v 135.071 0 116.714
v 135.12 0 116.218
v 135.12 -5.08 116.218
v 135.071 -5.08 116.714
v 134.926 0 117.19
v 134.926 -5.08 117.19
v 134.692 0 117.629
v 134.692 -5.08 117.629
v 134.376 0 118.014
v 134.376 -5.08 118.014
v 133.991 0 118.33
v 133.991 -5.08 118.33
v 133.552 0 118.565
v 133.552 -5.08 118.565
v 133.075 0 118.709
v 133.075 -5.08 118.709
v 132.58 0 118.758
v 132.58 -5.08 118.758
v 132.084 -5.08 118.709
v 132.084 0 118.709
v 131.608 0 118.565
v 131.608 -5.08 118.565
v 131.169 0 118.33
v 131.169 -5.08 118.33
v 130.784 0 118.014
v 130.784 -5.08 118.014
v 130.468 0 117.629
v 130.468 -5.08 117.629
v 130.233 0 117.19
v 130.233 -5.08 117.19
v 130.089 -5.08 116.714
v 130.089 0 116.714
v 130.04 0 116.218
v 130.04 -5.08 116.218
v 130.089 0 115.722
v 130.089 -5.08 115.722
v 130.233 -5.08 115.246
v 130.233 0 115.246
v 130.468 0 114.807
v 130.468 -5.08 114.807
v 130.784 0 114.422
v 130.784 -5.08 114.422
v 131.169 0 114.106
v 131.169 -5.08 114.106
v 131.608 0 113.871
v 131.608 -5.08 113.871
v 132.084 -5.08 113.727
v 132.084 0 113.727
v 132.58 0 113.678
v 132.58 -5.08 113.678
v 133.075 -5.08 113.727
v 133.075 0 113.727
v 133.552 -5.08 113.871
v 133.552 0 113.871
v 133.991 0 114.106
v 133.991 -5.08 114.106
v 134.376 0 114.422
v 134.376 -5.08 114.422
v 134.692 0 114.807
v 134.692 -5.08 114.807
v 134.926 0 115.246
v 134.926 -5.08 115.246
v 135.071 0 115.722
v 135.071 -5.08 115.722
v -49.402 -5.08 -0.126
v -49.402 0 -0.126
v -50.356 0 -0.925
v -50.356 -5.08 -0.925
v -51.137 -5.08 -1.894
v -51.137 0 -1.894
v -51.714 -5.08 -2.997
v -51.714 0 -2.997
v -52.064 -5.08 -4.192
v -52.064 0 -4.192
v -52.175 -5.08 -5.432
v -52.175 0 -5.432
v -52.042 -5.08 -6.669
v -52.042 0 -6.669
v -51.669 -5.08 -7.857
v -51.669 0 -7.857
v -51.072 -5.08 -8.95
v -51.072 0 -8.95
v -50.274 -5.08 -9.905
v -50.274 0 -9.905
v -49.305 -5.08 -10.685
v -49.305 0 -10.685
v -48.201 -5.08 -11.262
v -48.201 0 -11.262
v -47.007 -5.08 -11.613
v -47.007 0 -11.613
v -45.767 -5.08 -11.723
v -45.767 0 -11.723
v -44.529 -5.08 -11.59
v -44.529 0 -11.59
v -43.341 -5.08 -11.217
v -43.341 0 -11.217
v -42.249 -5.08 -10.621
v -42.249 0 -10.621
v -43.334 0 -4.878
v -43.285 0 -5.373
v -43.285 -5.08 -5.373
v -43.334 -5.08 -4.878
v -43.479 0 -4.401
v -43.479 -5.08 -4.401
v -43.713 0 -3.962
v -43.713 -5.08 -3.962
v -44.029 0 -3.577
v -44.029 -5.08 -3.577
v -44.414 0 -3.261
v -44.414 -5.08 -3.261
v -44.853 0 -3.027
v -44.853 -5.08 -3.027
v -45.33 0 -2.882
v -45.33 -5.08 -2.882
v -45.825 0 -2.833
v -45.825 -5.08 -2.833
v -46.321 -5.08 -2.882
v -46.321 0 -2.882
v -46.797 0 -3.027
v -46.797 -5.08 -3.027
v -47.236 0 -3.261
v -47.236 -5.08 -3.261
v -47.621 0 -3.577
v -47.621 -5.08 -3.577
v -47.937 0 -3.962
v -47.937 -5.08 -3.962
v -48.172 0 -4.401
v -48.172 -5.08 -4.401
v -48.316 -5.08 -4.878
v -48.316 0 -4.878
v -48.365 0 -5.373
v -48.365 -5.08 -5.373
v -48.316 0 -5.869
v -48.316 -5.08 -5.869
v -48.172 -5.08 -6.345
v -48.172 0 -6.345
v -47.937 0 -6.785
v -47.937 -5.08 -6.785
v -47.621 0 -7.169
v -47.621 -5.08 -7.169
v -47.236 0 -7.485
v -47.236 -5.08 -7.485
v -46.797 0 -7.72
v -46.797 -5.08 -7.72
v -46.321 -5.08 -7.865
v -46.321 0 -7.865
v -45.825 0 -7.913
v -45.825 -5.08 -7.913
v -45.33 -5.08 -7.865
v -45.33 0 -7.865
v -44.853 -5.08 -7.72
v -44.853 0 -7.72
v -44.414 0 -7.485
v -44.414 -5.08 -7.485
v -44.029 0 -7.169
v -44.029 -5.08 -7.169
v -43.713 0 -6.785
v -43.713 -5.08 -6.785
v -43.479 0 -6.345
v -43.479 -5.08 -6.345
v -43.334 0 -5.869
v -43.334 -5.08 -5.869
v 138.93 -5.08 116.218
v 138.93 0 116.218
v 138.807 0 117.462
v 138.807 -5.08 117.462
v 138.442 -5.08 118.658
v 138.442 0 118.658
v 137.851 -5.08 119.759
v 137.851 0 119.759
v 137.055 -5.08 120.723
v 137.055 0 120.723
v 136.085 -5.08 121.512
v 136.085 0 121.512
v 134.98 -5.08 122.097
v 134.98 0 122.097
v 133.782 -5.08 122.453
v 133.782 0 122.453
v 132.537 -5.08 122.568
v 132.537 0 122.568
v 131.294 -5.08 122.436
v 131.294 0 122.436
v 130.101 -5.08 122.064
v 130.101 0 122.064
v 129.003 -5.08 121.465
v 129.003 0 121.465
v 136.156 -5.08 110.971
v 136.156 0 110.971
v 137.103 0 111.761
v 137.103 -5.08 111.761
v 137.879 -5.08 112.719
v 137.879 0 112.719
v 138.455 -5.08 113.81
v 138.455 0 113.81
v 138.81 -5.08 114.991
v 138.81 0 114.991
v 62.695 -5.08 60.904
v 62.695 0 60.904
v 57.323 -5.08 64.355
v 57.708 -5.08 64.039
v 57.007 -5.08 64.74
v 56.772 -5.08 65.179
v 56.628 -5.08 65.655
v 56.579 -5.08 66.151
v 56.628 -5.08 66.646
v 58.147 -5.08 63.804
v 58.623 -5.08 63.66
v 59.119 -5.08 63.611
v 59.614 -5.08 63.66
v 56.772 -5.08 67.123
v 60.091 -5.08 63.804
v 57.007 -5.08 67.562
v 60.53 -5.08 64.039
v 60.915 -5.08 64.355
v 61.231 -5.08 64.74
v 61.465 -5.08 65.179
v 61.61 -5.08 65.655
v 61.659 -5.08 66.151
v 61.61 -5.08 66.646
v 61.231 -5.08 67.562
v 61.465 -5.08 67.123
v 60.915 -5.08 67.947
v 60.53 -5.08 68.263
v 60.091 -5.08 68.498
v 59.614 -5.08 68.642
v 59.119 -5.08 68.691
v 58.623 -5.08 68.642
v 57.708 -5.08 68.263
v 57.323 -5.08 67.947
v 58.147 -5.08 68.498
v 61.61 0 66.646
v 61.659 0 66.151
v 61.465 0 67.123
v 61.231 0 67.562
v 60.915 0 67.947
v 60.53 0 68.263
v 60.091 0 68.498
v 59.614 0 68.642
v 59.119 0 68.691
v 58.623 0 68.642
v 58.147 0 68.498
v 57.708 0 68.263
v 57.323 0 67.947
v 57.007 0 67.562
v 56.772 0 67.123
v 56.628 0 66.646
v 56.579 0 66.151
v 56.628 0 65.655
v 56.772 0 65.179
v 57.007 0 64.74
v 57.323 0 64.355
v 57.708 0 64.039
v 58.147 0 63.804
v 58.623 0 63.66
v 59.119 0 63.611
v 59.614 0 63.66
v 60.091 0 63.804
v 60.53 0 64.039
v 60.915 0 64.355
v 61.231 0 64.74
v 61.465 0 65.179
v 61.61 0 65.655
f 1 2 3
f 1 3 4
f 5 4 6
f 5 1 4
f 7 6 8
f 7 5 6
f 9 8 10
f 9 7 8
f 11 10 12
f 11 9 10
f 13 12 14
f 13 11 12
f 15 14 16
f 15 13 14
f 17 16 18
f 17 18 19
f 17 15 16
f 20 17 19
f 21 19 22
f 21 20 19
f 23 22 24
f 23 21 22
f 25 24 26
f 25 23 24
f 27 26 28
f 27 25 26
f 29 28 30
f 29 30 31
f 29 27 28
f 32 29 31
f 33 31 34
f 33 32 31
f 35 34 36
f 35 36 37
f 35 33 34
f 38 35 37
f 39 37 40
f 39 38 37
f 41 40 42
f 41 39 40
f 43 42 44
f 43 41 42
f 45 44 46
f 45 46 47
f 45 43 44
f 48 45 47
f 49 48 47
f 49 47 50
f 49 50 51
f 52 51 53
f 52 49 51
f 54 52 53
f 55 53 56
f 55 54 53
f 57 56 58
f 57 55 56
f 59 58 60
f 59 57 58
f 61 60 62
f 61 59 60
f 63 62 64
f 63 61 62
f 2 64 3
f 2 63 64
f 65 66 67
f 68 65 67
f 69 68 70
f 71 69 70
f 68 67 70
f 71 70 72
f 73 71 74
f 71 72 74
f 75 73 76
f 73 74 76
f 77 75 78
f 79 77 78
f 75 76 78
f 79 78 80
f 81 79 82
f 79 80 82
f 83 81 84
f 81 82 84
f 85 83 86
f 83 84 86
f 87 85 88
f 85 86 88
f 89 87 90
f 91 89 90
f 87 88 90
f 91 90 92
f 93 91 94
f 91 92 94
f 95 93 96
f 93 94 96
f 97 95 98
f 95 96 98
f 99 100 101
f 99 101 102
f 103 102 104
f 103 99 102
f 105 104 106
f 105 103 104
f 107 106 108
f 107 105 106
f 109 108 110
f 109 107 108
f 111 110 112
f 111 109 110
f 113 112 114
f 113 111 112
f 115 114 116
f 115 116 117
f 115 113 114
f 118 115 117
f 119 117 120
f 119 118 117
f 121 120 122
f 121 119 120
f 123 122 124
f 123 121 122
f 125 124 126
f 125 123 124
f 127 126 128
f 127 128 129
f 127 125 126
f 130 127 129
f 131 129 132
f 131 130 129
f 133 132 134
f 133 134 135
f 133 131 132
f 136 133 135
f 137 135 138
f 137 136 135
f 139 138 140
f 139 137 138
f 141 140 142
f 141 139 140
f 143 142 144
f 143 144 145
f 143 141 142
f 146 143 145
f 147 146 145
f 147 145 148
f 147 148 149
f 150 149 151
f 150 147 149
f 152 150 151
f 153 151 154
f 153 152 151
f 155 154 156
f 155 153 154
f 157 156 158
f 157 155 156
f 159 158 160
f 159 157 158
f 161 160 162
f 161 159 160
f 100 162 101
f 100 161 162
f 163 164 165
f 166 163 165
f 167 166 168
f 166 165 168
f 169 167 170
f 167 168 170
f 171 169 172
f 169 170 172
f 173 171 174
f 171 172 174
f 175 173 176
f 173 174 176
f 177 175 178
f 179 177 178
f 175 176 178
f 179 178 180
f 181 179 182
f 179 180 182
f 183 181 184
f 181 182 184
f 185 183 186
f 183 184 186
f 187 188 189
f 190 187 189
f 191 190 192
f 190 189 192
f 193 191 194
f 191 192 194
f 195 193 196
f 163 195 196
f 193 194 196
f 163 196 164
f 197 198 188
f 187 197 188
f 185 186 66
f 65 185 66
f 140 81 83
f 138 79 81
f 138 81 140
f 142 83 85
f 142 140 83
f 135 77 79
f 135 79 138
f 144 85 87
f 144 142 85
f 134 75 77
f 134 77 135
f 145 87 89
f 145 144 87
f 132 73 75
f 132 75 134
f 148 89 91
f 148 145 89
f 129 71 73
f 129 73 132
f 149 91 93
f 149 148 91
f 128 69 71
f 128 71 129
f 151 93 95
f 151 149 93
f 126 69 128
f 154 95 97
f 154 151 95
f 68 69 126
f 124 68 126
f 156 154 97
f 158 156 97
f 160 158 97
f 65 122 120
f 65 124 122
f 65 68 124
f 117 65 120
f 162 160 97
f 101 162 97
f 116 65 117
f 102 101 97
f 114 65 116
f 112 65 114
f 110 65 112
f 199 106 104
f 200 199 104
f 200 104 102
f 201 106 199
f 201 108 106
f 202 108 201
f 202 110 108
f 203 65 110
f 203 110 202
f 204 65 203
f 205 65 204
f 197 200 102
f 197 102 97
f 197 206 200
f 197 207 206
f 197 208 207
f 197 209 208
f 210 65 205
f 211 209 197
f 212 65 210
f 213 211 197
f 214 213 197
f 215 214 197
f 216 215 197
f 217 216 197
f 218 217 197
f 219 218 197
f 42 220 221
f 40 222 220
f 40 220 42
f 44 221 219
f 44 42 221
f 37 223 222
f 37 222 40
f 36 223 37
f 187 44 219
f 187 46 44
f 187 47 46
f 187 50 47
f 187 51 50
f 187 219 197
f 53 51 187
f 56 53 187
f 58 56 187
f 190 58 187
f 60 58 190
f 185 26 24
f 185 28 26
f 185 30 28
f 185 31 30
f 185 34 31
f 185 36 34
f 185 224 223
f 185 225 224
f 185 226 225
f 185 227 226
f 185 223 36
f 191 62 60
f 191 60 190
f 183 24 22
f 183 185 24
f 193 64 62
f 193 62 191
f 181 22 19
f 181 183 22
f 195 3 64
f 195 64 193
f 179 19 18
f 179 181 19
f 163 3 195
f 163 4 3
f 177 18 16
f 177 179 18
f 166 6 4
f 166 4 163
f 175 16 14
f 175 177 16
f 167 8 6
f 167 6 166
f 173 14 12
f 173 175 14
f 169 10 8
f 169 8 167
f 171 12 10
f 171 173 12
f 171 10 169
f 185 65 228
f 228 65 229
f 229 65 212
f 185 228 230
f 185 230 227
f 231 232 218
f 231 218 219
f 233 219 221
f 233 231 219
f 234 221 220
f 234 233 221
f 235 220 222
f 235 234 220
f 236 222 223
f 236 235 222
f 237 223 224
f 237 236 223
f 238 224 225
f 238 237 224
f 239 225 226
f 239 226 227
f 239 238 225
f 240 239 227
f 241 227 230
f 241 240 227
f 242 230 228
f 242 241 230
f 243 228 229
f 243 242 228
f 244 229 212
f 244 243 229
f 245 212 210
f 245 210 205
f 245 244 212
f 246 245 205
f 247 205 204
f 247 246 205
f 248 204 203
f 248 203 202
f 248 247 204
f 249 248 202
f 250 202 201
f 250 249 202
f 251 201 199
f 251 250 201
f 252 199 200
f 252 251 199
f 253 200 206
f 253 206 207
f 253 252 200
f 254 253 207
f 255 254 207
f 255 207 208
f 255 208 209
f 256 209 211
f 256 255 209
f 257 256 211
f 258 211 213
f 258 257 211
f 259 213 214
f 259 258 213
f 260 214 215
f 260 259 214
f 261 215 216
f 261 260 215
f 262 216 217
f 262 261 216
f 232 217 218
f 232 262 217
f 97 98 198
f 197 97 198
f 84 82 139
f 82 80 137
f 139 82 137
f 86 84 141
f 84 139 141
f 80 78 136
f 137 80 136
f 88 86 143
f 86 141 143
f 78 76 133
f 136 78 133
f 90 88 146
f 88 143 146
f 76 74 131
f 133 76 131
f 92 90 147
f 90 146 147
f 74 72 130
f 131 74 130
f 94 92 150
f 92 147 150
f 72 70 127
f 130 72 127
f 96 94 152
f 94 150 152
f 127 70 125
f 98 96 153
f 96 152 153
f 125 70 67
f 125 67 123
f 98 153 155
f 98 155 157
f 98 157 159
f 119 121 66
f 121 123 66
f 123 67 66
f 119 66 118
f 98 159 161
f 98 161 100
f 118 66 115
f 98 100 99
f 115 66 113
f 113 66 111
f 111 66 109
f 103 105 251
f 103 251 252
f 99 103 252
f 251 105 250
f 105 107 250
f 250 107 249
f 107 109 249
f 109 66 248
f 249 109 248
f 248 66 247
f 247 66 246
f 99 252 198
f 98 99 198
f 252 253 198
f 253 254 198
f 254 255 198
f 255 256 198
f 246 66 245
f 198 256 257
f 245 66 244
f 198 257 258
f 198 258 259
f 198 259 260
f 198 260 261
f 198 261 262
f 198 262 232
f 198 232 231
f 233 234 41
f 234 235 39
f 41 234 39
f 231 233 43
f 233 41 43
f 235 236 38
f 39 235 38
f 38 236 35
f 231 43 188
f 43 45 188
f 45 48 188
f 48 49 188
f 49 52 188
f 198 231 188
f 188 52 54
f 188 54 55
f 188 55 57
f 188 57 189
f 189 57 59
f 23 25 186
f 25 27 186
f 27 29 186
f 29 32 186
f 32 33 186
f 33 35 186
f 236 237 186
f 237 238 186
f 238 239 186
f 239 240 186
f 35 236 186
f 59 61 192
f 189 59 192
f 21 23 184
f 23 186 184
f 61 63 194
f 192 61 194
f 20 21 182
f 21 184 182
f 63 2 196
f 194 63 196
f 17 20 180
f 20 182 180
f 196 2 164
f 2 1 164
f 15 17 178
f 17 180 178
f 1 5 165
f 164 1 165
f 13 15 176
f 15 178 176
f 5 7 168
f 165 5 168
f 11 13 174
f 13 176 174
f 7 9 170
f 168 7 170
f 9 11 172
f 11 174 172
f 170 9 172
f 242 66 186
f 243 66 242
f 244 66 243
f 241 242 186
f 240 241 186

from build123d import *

# Parameters (mm, degrees)
F0_R     = 2.54
F1_DEPTH = 5.08


with BuildPart() as f1:
    # F0 (on Front) → F1 (new body)
    with BuildSketch(Plane.XZ):
        with BuildLine():
            ThreePointArc((-42.2490756804, -10.6206300524), (-40.2114050241, -8.3410427676), (-39.4752932215, -5.3734243105))
            ThreePointArc((-39.4752932215, -5.3734243105), (-42.8576747645, 0.2404638869), (-49.4015107627, -0.1262185685))
            ThreePointArc((-49.4015107627, -0.1262185685), (-51.0724989635, -8.9496418517), (-42.2490756804, -10.6206300524))
        make_face()
        with Locations((-45.8252932215, -5.3734243105)):
            Circle(F0_R, mode=Mode.SUBTRACT)
        with BuildLine():
            ThreePointArc((-49.4015107627, -0.1262185685), (-42.8576747645, 0.2404638869), (-39.4752932215, -5.3734243105))
            ThreePointArc((-39.4752932215, -5.3734243105), (-40.2114050241, -8.3410427676), (-42.2490756804, -10.6206300524))
            Line((-42.2490756804, -10.6206300524), (62.6950390311, 60.9037206843))
            ThreePointArc((62.6950390311, 60.9037206843), (53.8716158307, 62.5747090371), (55.5426040793, 71.3981322572))
            Line((55.5426040793, 71.3981322572), (-49.4015107627, -0.1262185685))
        make_face()
        with BuildLine():
            Line((129.0034844631, 121.4651778314), (55.5426040793, 71.3981322572))
            ThreePointArc((55.5426040793, 71.3981322572), (62.086440076, 71.7648147095), (65.4688216172, 66.150926513))
            ThreePointArc((65.4688216172, 66.150926513), (64.7327097786, 63.1833079879), (62.6950390311, 60.9037206843))
            Line((62.6950390311, 60.9037206843), (136.1559195454, 110.9707663475))
            ThreePointArc((136.1559195454, 110.9707663475), (127.3324962623, 112.6417545483), (129.0034844631, 121.4651778314))
        make_face()
        with BuildLine():
            ThreePointArc((65.4688216172, 66.150926513), (62.086440076, 71.7648147095), (55.5426040793, 71.3981322572))
            ThreePointArc((55.5426040793, 71.3981322572), (53.8716158307, 62.5747090371), (62.6950390311, 60.9037206843))
            ThreePointArc((62.6950390311, 60.9037206843), (64.7327097786, 63.1833079879), (65.4688216172, 66.150926513))
        make_face()
        with Locations((59.1188216172, 66.150926513)):
            Circle(F0_R, mode=Mode.SUBTRACT)
        with BuildLine():
            ThreePointArc((138.9297020042, 116.2179720895), (135.5473204613, 121.8318602869), (129.0034844631, 121.4651778314))
            ThreePointArc((129.0034844631, 121.4651778314), (127.3324962623, 112.6417545483), (136.1559195454, 110.9707663475))
            ThreePointArc((136.1559195454, 110.9707663475), (138.1935902017, 113.2503536324), (138.9297020042, 116.2179720895))
        make_face()
        with Locations((132.5797020042, 116.2179720895)):
            Circle(F0_R, mode=Mode.SUBTRACT)
    extrude(amount=F1_DEPTH)


solid = f1.part
